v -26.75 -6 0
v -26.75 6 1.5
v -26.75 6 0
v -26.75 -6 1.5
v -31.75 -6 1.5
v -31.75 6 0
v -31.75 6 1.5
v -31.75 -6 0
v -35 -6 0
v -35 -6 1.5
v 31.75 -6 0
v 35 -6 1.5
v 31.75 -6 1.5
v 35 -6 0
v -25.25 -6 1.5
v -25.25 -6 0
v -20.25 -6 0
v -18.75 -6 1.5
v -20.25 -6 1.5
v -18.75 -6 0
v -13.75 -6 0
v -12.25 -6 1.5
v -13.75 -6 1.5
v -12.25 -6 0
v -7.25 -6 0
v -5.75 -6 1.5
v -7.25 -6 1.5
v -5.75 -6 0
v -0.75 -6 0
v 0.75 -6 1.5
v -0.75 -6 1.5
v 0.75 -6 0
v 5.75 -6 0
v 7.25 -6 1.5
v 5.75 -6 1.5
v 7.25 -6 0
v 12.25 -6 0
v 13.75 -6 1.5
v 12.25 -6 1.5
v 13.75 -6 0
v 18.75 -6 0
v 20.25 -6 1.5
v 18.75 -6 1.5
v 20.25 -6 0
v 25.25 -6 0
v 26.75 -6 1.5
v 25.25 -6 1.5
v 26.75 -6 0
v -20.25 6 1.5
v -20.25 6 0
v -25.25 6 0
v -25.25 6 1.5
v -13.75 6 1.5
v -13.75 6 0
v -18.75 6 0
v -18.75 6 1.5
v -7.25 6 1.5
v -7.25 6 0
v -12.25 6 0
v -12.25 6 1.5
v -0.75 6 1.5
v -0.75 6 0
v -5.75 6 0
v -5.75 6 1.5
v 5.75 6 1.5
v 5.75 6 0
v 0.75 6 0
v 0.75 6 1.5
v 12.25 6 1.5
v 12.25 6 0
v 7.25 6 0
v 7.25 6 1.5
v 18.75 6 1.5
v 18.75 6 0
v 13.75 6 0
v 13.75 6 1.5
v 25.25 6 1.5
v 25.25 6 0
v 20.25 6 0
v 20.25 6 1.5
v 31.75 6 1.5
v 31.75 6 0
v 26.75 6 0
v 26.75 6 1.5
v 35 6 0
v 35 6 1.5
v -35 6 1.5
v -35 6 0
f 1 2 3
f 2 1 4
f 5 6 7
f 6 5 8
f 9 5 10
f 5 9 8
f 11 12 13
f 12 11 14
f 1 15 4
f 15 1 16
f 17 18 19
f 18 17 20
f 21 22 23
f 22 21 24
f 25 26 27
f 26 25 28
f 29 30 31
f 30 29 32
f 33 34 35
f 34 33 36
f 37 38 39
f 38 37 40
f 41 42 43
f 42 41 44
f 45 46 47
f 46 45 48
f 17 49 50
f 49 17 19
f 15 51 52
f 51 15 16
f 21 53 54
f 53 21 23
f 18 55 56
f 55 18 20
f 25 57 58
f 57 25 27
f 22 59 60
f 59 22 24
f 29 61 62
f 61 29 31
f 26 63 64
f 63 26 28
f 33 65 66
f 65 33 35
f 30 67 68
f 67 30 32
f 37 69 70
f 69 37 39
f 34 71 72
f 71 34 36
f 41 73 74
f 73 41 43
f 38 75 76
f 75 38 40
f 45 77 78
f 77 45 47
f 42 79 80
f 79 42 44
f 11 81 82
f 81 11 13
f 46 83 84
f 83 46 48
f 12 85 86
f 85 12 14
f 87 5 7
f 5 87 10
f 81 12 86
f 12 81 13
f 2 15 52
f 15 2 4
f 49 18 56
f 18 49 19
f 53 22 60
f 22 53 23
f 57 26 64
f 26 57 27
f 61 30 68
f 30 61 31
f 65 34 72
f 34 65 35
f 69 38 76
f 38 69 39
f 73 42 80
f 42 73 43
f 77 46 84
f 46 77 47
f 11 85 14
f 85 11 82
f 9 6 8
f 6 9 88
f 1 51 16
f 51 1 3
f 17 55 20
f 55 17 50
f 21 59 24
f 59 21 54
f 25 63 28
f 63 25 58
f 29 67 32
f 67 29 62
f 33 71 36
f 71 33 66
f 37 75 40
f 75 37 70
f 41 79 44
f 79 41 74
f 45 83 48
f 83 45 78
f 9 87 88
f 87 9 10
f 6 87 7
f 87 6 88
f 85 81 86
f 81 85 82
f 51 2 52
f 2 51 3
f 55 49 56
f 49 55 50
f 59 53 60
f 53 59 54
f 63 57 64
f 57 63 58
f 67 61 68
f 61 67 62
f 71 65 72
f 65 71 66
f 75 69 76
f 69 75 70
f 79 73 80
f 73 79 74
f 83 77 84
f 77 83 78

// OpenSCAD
// 10-well comb for casting agarose gels, printed lying flat
// Units: mm. Print orientation: flat on bed, teeth pointing -Y.

// ---------- Parameters ----------
spine_len      = 70;    // spine (back bar) length along X
spine_wid      = 12;    // spine width along Y
plate_thk      = 1.5;   // plate thickness along Z

tooth_count    = 10;    // number of teeth
tooth_w        = 5.0;   // tooth width along X
tooth_len      = 12;    // tooth length along Y
tooth_gap      = 1.5;   // gap between neighbouring teeth along X

eps            = 0.5;   // cutter overshoot past faces
$fn            = 64;    // curve resolution (no curves here, set per rules)

// ---------- Derived ----------
row_len       = tooth_w * tooth_count + (tooth_count - 1) * tooth_gap;  // 55 mm
y0            = -tooth_len / 2;                                         // tooth row Y centre

// ---------- Model ----------
difference() {
    // Base plate with spine
    translate([-spine_len / 2, -spine_wid / 2, 0])
        cube([spine_len, spine_wid, plate_thk]);

    // Teeth cut out from -Y side, centred on spine in X
    for (i = [0 : tooth_count - 1]) {
        x_c = (i - (tooth_count - 1) / 2) * (tooth_w + tooth_gap);
        translate([x_c - tooth_w / 2, y0, -eps])
            cube([tooth_w, tooth_len + tooth_w, plate_thk + 2 * eps]);
    }
}
